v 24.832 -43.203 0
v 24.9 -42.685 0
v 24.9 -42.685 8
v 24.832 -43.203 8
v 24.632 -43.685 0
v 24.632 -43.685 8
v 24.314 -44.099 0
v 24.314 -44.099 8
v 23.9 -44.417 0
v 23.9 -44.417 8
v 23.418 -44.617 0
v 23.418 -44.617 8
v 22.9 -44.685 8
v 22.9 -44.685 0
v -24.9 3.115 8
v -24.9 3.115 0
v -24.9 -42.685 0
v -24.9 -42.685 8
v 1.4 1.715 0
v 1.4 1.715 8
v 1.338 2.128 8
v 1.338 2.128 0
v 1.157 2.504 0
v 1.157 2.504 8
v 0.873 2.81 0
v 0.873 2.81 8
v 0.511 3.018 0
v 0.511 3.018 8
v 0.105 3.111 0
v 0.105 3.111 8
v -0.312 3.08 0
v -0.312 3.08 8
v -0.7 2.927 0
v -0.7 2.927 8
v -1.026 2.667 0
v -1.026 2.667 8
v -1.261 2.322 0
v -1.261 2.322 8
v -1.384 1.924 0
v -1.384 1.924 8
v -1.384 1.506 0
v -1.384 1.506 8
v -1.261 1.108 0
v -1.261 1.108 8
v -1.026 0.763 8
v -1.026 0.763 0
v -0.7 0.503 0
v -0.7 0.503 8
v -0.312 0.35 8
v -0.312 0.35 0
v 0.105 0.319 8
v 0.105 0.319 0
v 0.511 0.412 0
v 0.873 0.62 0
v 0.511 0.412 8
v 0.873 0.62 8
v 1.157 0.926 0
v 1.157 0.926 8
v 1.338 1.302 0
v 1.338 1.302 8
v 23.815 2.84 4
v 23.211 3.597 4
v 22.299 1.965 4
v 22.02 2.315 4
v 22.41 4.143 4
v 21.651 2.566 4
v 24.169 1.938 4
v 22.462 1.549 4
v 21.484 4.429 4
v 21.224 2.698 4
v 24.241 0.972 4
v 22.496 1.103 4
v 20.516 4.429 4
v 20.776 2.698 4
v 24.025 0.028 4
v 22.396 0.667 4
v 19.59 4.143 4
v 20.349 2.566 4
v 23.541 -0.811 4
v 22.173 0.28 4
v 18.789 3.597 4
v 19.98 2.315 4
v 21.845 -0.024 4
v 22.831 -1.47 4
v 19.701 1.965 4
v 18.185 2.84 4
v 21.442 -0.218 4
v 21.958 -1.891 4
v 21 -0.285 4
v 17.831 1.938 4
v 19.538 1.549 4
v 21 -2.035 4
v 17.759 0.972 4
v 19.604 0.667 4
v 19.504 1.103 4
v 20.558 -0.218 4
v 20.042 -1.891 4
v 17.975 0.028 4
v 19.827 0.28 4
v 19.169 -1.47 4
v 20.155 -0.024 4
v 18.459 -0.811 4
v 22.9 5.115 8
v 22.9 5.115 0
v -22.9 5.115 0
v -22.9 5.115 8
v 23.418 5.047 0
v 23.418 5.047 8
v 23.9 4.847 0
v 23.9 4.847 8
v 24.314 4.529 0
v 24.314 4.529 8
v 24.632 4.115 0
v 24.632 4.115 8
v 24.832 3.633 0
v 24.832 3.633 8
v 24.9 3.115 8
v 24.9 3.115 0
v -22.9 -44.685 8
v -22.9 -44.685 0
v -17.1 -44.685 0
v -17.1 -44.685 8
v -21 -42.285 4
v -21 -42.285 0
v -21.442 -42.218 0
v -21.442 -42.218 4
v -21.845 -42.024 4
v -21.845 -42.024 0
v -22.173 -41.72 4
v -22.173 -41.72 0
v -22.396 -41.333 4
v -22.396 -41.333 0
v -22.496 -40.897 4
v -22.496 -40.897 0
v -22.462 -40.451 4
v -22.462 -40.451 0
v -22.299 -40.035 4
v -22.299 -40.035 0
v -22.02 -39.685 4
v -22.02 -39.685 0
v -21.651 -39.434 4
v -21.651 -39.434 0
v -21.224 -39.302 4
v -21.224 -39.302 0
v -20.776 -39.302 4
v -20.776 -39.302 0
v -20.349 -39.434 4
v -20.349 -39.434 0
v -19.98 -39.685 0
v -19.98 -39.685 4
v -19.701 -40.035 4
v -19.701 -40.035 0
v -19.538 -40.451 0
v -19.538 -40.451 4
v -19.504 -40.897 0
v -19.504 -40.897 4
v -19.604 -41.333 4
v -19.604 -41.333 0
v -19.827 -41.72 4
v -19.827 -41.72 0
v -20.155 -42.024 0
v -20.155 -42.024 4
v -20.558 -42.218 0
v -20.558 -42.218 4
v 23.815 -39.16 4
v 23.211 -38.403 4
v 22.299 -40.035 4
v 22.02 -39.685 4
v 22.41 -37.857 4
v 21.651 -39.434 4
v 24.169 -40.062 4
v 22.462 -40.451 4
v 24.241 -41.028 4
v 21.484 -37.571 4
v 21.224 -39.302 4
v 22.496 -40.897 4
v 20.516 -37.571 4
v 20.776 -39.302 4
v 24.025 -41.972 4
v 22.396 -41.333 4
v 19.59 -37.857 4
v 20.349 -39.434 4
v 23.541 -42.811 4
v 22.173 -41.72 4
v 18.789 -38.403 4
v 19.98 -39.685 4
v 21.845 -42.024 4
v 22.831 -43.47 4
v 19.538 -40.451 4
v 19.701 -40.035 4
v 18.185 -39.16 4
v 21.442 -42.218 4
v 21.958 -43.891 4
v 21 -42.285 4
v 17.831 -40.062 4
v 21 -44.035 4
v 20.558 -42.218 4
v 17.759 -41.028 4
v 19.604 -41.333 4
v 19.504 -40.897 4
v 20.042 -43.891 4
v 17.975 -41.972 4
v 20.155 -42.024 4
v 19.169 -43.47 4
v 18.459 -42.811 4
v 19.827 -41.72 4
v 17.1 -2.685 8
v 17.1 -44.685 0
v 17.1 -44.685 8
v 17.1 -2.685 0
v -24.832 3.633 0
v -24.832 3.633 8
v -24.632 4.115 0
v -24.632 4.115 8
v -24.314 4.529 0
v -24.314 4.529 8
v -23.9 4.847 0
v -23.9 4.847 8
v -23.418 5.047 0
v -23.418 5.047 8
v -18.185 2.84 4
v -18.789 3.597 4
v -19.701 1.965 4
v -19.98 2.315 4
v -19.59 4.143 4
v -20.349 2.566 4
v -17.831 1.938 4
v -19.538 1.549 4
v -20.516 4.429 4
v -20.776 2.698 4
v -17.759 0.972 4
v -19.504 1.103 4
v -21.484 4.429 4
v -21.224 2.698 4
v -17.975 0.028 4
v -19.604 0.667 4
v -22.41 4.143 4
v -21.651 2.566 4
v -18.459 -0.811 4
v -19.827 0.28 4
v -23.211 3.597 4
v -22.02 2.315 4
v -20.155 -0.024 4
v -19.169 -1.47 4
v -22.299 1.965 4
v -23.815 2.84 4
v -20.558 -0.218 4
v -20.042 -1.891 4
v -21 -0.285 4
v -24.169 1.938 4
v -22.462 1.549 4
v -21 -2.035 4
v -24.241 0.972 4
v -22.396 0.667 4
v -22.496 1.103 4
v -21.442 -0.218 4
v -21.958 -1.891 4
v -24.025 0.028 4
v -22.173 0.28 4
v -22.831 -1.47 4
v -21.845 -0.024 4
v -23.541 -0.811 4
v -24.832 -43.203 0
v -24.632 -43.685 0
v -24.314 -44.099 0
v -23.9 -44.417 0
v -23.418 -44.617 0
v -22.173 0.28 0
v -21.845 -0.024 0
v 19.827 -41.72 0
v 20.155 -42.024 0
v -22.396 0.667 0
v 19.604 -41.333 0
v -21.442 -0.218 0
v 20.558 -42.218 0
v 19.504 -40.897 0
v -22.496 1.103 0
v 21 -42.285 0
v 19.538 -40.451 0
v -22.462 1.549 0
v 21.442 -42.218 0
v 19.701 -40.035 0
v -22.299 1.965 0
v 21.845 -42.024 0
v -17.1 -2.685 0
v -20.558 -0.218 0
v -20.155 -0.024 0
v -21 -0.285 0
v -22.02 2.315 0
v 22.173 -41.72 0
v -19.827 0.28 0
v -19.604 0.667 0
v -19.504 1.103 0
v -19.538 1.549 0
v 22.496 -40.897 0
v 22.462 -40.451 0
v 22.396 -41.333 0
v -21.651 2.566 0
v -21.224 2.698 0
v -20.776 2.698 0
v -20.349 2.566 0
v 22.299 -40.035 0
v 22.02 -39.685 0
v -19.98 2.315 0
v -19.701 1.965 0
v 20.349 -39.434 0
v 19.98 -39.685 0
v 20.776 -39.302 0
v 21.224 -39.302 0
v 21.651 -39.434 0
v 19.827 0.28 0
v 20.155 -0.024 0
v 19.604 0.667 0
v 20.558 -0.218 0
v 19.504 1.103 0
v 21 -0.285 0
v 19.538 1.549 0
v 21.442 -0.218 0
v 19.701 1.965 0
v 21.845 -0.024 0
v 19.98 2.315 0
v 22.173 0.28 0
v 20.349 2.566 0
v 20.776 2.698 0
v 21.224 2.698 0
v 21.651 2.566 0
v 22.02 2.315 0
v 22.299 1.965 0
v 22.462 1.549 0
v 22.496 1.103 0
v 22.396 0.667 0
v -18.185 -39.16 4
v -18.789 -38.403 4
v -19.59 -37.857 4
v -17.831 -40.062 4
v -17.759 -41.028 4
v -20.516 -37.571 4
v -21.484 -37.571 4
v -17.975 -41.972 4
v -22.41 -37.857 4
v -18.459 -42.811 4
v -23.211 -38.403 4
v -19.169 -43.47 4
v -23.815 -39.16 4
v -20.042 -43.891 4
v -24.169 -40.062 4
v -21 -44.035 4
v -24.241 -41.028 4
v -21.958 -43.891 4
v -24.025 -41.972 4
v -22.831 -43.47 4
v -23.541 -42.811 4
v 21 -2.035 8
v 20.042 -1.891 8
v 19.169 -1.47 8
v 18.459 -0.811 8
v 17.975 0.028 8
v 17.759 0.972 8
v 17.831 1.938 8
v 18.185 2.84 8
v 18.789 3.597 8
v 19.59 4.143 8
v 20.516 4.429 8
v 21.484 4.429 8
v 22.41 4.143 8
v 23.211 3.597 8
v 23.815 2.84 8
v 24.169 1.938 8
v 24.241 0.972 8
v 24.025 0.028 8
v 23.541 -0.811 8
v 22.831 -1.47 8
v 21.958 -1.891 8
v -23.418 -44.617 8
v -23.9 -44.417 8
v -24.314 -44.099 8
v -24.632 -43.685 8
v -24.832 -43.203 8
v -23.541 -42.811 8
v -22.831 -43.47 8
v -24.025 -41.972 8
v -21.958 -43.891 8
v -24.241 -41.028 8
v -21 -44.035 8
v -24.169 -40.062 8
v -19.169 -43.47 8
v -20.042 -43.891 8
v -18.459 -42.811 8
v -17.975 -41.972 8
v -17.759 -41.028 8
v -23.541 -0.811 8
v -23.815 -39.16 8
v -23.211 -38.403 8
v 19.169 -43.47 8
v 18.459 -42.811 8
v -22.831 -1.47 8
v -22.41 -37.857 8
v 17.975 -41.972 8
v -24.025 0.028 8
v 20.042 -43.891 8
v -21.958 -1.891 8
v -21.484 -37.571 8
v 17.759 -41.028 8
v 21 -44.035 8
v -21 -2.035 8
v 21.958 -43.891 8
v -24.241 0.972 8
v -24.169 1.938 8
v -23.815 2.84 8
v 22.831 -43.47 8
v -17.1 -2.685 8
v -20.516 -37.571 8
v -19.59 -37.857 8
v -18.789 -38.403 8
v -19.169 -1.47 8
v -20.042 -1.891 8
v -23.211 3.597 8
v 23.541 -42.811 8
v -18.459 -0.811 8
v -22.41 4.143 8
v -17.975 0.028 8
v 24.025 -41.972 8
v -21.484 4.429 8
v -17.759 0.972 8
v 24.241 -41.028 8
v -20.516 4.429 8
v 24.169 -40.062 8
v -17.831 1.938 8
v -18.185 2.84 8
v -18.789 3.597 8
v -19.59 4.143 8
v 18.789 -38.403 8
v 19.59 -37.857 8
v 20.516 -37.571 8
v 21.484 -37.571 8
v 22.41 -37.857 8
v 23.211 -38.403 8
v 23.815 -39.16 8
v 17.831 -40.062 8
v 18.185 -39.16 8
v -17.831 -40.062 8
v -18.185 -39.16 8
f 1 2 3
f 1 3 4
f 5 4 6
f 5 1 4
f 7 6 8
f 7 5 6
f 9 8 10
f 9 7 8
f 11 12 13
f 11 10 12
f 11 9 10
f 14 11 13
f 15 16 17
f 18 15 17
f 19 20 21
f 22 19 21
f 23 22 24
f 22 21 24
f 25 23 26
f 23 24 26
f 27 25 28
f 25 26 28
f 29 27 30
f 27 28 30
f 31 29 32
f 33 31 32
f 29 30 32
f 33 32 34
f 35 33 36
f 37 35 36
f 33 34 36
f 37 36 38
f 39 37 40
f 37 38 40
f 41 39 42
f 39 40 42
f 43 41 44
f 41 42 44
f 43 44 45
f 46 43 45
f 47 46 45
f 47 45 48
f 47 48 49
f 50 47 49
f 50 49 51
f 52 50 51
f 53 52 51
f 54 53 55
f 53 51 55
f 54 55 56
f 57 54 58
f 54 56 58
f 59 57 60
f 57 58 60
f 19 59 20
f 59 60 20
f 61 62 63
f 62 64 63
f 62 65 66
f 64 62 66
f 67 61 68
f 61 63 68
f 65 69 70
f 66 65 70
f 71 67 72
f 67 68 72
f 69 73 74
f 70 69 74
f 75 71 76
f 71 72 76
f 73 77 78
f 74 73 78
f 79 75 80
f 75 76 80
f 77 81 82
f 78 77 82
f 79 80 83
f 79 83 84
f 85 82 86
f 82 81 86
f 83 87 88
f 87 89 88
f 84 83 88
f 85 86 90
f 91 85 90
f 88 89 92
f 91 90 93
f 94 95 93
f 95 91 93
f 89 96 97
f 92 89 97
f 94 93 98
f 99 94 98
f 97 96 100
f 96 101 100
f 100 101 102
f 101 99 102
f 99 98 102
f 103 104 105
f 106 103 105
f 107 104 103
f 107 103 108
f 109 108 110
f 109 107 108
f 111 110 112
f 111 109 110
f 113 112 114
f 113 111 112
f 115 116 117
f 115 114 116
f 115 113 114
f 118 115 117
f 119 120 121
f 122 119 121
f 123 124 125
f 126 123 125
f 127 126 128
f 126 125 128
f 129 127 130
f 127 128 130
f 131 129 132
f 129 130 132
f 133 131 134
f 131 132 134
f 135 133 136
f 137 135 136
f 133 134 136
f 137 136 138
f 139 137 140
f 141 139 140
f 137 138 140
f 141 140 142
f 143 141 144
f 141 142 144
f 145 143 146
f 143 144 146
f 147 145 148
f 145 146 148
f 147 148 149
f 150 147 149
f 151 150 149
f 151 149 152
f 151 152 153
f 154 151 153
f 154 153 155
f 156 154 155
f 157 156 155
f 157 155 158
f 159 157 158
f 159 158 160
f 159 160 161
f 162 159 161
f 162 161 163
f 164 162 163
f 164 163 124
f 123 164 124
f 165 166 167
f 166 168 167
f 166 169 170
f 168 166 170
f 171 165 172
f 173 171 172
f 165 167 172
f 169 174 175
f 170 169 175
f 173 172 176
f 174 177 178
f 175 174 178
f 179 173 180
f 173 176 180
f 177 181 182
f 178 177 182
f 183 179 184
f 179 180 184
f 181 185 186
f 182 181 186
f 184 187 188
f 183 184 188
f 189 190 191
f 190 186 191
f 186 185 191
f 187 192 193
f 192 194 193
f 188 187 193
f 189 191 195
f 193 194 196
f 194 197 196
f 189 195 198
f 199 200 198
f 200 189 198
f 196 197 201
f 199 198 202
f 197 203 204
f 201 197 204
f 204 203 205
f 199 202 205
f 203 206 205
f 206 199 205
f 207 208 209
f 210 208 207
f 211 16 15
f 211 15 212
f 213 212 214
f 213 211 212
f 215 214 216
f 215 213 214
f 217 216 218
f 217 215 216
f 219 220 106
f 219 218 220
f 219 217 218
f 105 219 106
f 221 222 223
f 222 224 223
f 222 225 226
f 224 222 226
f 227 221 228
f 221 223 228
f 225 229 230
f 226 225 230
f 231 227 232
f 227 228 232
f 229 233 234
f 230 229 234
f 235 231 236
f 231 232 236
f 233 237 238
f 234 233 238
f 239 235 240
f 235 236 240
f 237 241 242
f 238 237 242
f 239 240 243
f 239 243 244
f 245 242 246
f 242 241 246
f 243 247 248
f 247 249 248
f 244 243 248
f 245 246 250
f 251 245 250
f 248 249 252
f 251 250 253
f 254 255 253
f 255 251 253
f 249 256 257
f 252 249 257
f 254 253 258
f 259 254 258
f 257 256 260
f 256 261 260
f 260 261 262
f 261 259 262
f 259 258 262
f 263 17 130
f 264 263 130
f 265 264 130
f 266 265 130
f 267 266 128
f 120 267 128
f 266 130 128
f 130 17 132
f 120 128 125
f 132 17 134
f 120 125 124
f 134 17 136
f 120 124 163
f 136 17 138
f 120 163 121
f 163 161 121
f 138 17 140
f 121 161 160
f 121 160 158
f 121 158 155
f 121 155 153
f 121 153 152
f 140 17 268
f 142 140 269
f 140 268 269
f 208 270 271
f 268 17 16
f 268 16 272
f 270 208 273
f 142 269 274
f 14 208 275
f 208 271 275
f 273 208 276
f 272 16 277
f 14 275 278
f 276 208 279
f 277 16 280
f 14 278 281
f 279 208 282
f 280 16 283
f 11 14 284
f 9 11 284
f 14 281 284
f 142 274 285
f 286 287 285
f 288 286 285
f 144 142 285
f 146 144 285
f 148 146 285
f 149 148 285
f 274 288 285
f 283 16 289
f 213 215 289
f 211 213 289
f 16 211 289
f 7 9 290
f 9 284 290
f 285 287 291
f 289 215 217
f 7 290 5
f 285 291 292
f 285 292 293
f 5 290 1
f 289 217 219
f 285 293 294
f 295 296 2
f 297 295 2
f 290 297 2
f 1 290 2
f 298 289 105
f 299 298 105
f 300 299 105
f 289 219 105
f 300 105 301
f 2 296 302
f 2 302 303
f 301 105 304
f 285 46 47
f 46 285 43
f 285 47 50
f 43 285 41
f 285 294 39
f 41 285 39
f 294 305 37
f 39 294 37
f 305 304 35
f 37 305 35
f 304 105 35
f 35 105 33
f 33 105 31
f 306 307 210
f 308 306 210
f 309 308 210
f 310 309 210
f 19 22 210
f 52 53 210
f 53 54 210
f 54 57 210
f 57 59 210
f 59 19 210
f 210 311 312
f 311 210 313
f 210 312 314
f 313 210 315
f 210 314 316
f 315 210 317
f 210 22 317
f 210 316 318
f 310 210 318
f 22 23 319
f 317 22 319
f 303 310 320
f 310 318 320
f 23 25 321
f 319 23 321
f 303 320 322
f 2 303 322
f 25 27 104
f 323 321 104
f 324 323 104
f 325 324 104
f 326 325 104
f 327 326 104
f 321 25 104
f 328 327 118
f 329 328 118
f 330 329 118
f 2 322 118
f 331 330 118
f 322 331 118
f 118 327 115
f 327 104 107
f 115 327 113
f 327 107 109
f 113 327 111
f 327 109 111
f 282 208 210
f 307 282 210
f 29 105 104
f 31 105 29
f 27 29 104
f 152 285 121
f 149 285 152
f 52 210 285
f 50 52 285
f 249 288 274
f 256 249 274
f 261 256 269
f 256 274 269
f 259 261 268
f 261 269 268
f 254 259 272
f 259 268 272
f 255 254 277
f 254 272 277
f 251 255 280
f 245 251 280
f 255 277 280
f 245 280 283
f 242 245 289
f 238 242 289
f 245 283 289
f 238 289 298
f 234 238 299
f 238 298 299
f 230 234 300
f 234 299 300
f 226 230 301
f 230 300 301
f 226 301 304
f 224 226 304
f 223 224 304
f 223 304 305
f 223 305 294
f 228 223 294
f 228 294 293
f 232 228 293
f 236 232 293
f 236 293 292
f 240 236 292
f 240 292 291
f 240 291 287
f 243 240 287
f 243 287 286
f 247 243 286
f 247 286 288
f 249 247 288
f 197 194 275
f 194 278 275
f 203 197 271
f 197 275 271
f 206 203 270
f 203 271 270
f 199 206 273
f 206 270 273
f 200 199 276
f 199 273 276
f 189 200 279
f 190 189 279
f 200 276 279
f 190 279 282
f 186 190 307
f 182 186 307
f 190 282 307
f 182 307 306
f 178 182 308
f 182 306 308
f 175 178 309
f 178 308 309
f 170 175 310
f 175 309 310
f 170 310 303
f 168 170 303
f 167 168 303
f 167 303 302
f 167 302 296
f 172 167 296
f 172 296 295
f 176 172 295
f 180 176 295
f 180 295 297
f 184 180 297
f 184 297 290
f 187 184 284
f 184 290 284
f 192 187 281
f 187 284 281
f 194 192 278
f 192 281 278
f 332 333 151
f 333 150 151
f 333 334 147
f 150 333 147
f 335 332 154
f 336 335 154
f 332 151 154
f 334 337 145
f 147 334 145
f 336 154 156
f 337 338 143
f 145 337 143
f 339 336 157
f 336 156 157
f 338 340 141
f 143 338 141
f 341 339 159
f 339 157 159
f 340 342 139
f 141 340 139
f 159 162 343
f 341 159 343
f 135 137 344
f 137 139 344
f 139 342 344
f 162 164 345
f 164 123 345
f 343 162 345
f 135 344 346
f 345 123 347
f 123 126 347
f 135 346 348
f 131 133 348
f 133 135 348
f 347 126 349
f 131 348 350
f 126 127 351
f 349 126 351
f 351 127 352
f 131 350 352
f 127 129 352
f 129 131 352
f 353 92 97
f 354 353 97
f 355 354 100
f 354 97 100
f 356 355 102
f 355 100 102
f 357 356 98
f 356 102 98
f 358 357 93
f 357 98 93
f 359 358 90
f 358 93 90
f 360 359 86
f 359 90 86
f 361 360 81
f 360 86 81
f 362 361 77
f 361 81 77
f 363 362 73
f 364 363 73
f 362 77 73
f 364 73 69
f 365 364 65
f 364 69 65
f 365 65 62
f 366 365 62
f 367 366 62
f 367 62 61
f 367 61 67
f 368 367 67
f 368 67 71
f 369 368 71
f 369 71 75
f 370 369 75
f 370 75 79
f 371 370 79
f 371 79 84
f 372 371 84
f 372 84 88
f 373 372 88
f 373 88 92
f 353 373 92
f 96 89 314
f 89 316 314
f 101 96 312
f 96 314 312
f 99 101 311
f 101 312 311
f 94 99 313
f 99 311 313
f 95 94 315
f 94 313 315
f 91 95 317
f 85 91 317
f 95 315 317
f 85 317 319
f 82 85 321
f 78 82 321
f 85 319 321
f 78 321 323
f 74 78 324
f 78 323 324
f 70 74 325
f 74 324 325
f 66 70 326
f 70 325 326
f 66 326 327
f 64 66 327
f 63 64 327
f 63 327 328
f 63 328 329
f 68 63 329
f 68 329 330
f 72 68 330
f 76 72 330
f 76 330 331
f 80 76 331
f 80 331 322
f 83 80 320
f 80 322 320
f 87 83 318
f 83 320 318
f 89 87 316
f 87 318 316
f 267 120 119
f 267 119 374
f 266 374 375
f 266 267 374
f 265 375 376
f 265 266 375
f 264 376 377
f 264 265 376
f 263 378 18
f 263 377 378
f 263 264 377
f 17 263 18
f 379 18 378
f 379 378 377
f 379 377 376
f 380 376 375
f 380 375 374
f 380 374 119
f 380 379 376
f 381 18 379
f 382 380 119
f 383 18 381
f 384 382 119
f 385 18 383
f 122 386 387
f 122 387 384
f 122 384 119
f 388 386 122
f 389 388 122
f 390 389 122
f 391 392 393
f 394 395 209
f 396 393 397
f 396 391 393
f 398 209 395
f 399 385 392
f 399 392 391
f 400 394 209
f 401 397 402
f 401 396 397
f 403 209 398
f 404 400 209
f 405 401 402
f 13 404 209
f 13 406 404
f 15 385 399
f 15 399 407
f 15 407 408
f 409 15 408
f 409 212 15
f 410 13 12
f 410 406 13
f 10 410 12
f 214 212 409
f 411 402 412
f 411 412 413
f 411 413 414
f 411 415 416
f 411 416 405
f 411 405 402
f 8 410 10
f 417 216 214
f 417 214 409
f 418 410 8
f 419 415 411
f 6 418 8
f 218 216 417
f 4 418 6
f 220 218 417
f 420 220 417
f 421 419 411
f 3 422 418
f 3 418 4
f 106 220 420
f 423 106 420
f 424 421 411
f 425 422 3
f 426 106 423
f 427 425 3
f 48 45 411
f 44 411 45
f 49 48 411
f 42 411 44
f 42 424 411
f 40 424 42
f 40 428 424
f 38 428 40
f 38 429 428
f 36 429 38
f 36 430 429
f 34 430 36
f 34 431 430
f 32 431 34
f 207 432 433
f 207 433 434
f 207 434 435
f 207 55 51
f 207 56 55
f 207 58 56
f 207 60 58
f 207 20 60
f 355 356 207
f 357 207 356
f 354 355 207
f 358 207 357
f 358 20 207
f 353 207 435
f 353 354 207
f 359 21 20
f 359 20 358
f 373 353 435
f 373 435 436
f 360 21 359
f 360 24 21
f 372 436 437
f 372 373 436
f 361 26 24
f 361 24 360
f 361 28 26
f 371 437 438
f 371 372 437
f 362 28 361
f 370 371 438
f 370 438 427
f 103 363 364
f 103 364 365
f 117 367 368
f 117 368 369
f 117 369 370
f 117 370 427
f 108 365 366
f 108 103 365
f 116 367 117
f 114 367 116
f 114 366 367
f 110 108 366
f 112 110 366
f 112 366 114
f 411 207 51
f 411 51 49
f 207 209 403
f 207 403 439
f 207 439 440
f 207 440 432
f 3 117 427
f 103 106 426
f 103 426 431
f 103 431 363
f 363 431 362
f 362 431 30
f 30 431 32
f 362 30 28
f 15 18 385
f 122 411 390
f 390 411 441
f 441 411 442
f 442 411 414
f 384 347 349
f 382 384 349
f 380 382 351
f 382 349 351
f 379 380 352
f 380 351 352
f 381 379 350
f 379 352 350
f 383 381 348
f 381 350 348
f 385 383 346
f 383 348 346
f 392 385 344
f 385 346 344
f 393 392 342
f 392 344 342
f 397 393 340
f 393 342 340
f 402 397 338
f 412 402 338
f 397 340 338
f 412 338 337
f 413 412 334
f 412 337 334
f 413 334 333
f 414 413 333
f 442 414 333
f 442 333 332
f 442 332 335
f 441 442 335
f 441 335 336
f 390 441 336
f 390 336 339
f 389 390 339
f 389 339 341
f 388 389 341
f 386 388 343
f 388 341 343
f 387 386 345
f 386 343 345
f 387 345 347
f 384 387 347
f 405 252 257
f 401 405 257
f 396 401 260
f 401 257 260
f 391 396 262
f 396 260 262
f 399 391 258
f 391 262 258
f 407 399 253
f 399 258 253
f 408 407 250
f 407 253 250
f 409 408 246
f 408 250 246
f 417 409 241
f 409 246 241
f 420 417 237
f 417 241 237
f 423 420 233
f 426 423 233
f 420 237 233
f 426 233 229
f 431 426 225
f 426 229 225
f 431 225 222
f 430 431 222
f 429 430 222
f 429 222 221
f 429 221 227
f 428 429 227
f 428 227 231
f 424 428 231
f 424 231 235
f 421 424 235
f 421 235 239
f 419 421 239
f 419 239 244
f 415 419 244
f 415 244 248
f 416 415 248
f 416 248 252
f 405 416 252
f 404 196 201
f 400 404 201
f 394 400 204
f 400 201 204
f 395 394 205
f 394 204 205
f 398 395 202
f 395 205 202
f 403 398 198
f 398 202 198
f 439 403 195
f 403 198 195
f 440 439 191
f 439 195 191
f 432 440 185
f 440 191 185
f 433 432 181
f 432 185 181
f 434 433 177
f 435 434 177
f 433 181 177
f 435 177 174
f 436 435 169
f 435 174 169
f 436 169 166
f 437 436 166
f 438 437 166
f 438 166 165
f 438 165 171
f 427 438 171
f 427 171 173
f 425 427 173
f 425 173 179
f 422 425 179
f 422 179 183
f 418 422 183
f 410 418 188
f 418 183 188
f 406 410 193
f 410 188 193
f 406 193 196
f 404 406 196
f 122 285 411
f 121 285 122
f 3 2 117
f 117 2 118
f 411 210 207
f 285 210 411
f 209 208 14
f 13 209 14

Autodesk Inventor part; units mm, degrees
ref_plane "YZ Plane" through (0, 0, 0) normal (1, 0, 0) x (0, 1, 0)
ref_plane "XZ Plane" through (0, 0, 0) normal (0, 1, 0) x (-1, 0, 0)
ref_plane "XY Plane" through (0, 0, 0) normal (0, 0, 1) x (1, 0, 0)
sketch "Sketch1" plane through (0, 0, 0) normal (0, 0, 1) x (1, 0, 0)
  circle A0 centre (-21, 1.215) radius 1.4 projected
  circle A1 centre (21, 1.215) radius 1.4 projected
  arc A2 (24.9, 3.115) -> (22.9, 5.115) centre (22.9, 3.115) ccw projected
  line L0 (22.9, 5.115) -> (-22.9, 5.115) projected
  arc A3 (-22.9, 5.115) -> (-24.9, 3.115) centre (-22.9, 3.115) ccw projected
  line L1 (-24.9, 3.115) -> (-24.9, -5.115) projected
  line L2 (-24.9, -5.115) -> (-22.8395, -5.115) projected
  line L3 (24.9, -5.115) -> (24.9, 3.115) projected
  arc A4 (22.9, -44.685) -> (24.9, -42.685) centre (22.9, -42.685) ccw projected
  line L4 (24.9, -42.685) -> (24.9, -36.885) projected
  line L5 (24.9, -36.885) -> (17.1, -36.885) projected
  line L6 (17.1, -36.885) -> (17.1, -44.685) projected
  line L7 (17.1, -44.685) -> (22.9, -44.685) projected
  circle A5 centre (21, -40.785) radius 1.4 projected
  arc A6 (-24.9, -42.685) -> (-22.9, -44.685) centre (-22.9, -42.685) ccw projected
  line L8 (-22.9, -44.685) -> (-17.1, -44.685) projected
  line L9 (-17.1, -44.685) -> (-17.1, -36.885) projected
  line L10 (-17.1, -36.885) -> (-24.9, -36.885) projected
  line L11 (-24.9, -36.885) -> (-24.9, -42.685) projected
  circle A7 centre (-21, -40.785) radius 1.4 projected
  line L12 (24.9, 5.115) -> (-24.9, 5.115)
  line L13 (-24.9, 5.115) -> (-24.9, -44.685)
  line L14 (-24.9, -44.685) -> (24.9, -44.685)
  line L15 (24.9, -44.685) -> (24.9, 5.115)
  line L16 (17.1, -2.685) -> (-17.1, -2.685)
  line L17 (-17.1, -2.685) -> (-17.1, -36.885)
  line L18 (-17.1, -36.885) -> (17.1, -36.885)
  line L19 (17.1, -36.885) -> (17.1, -2.685)
  line L20 (17.1, -36.885) -> (17.1, -44.685)
  line L21 (-17.1, -36.885) -> (-17.1, -44.685)
  circle A8 centre (0, 1.415) radius 1.4 projected
  arc A9 (-18.2605, -5.115) -> (-22.8395, -5.115) centre (-20.55, -5.335) ccw projected
  arc A10 (22.8395, -5.115) -> (18.2605, -5.115) centre (20.55, -5.335) ccw projected
  circle A11 centre (14.45, 0.765) radius 2.3 projected
  circle A12 centre (-14.45, 0.765) radius 2.3 projected
  line L22 (-18.2605, -5.115) -> (18.2605, -5.115) projected
  line L23 (22.8395, -5.115) -> (24.9, -5.115) projected
  point P0 (0, 0)
  point P1 (-20.55, -5.335)
  point P2 (20.55, -5.335)
  point P3 (-20.55, -5.335)
  point P4 (20.55, -5.335)
  point P5 (-20.55, -5.335)
  point P6 (20.55, -5.335)
  dimension "d0" = 7.8
extrude "Extrusion1" add sketch "Sketch1" along normal blind 8 contours L3 L23 A10 L22 L19 L16 L17 A9 L2 L1 A3 L0 A2 | L15 L5 L19 L22 A10 L23 | L4 A4 L7 L6 L5 | L2 A9 L22 L17 L10 L13 | L9 L8 A6 L11 L10 | A8 | A11 | A12
sketch "Sketch2" plane through (0, 0, 8) normal (0, 0, 1) x (1, 0, 0)
  circle A0 centre (0, 1.715) radius 1.4
  line L0 (22.9, 5.115) -> (-22.9, 5.115) projected
  point P0 (0, 0)
  dimension "d3" = 2.8
  dimension "d4" = 3.4
extrude "Extrusion2" cut sketch "Sketch2" against normal blind 8
ref_plane "Arbeitsebene1" through (15.3065, -4.4785, 13.1) normal (0, 0, 1) x (0, 1, 0)
sketch "Skizze3" plane through (15.3065, -4.4785, 13.1) normal (0, 0, 1) x (0, 1, 0)
  line L0 (-0.7065, 32.7565) -> (-31.2065, 32.7565) projected
  arc A0 (1.2935, 30.7565) -> (-0.7065, 32.7565) centre (-0.7065, 30.7565) ccw projected
  line L1 (1.2935, 30.7565) -> (1.2935, 0.2565) projected
  arc A1 (-0.7065, -1.7435) -> (1.2935, 0.2565) centre (-0.7065, 0.2565) ccw projected
  line L2 (-0.7065, -1.7435) -> (-31.2065, -1.7435) projected
  arc A2 (-33.2065, 0.2565) -> (-31.2065, -1.7435) centre (-31.2065, 0.2565) ccw projected
  line L3 (-33.2065, 0.2565) -> (-33.2065, 30.7565) projected
  arc A3 (-31.2065, 32.7565) -> (-33.2065, 30.7565) centre (-31.2065, 30.7565) ccw projected
  line L4 (-38.9565, -9.4935) -> (-20.9565, -9.4935) projected
  arc A4 (7.0435, -9.4935) -> (9.0435, -7.4935) centre (7.0435, -7.4935) ccw projected
  line L5 (9.0435, 10.5065) -> (9.0435, -7.4935) projected
  line L6 (9.0435, 10.5065) -> (10.195, 10.5065) projected
  arc A5 (10.6845, 10.1086) -> (10.195, 10.5065) centre (10.195, 10.0065) ccw projected
  arc A6 (10.6845, 10.1086) -> (14.5435, 10.5065) centre (12.5935, 10.5065) ccw projected
  line L7 (14.5435, 10.5065) -> (14.5435, 20.6065) projected
  line L8 (9.0435, 38.5065) -> (9.0435, 20.5065) projected
  arc A7 (9.0435, 38.5065) -> (7.0435, 40.5065) centre (7.0435, 38.5065) ccw projected
  line L9 (-21.0689, 40.5065) -> (-38.9565, 40.5065) projected
  line L10 (7.0435, 40.5065) -> (-10.8565, 40.5065) projected
  arc A8 (-38.9565, 40.5065) -> (-40.9565, 38.5065) centre (-38.9565, 38.5065) ccw projected
  line L11 (-40.9565, 20.6065) -> (-40.9565, 38.5065) projected
  line L12 (-40.9565, -7.4935) -> (-40.9565, 10.3942) projected
  arc A9 (-40.9565, -7.4935) -> (-38.9565, -9.4935) centre (-38.9565, -7.4935) ccw projected
  line L13 (-20.9565, -9.4935) -> (-20.9565, -10.645) projected
  arc A10 (-21.3545, -11.1345) -> (-20.9565, -10.645) centre (-21.4565, -10.645) ccw projected
  arc A11 (-21.3545, -11.1345) -> (-20.9565, -14.9935) centre (-20.9565, -13.0435) ccw projected
  line L14 (-20.9565, -14.9935) -> (-10.8565, -14.9935) projected
  circle A12 centre (-15.9565, -5.8535) radius 1.6 projected
  circle A13 centre (5.4035, 15.5065) radius 1.6 projected
  line L15 (-21.0689, 39.3752) -> (-21.0689, 40.5065) projected
  line L16 (-40.9565, 20.6065) -> (-39.8237, 20.6065) projected
  arc A14 (-39.8237, 20.6065) -> (-39.429, 20.9412) centre (-39.8237, 21.0065) ccw projected
  arc A15 (-35.3565, 20.6065) -> (-39.429, 20.9412) centre (-37.4065, 20.6065) ccw projected
  line L17 (-35.3565, 20.6065) -> (-35.3565, 10.5065) projected
  arc A16 (-39.4194, 10.1183) -> (-35.3565, 10.5065) centre (-37.4065, 10.5065) ccw projected
  arc A17 (-39.4194, 10.1183) -> (-39.8252, 10.3942) centre (-39.7609, 10.0524) ccw projected
  line L18 (-39.8252, 10.3942) -> (-40.9565, 10.3942) projected
  arc A18 (-10.8565, -14.9935) -> (-10.5382, -11.1196) centre (-10.8565, -13.0435) ccw projected
  arc A19 (-10.9565, -10.6263) -> (-10.5382, -11.1196) centre (-10.4565, -10.6263) ccw projected
  line L19 (-10.9565, -10.6263) -> (-10.9565, -9.4935) projected
  line L20 (-10.9565, -9.4935) -> (7.0435, -9.4935) projected
  arc A20 (14.5435, 20.6065) -> (10.6696, 20.9249) centre (12.5935, 20.6065) ccw projected
  arc A21 (10.1763, 20.5065) -> (10.6696, 20.9249) centre (10.1763, 21.0065) ccw projected
  line L21 (10.1763, 20.5065) -> (9.0435, 20.5065) projected
  line L22 (-10.8565, 40.5065) -> (-10.8565, 39.3737) projected
  arc A22 (-10.8565, 39.3737) -> (-10.5218, 38.979) centre (-10.4565, 39.3737) ccw projected
  arc A23 (-10.8565, 34.9065) -> (-10.5218, 38.979) centre (-10.8565, 36.9565) ccw projected
  line L23 (-10.8565, 34.9065) -> (-20.9565, 34.9065) projected
  arc A24 (-21.3448, 38.9694) -> (-20.9565, 34.9065) centre (-20.9565, 36.9565) ccw projected
  arc A25 (-21.3448, 38.9694) -> (-21.0689, 39.3752) centre (-21.4107, 39.3109) ccw projected
  circle A26 centre (4.0435, -4.4935) radius 2.45 projected
  circle A27 centre (-1.4565, -5.2935) radius 2.3 projected
  circle A28 centre (4.8435, 1.0065) radius 2.3 projected
  circle A29 centre (4.8435, 30.0065) radius 2.3 projected
  circle A30 centre (-1.4565, 36.3065) radius 2.3 projected
  circle A31 centre (4.0435, 35.5065) radius 2.45 projected
  circle A32 centre (-36.7565, 1.0065) radius 2.3 projected
  circle A33 centre (-30.4565, -5.2935) radius 2.3 projected
  circle A34 centre (-35.9565, -4.4935) radius 2.45 projected
  circle A35 centre (-36.7565, 30.0065) radius 2.3 projected
  circle A36 centre (-30.4565, 36.3065) radius 2.3 projected
  circle A37 centre (-35.9565, 35.5065) radius 2.45 projected
  point P0 (4.4785, 15.3065)
hole "Bohrung1" [suppressed]
sketch "Skizze4" plane through (0, 0, 8) normal (0, 0, 1) x (1, 0, 0)
  circle A0 centre (0, 1.715) radius 1.4 projected
  line L0 (17.1, -2.685) -> (17.1, -44.685) projected
  line L1 (17.1, -44.685) -> (22.9, -44.685) projected
  arc A1 (22.9, -44.685) -> (24.9, -42.685) centre (22.9, -42.685) ccw projected
  line L2 (24.9, -42.685) -> (24.9, 3.115) projected
  arc A2 (24.9, 3.115) -> (22.9, 5.115) centre (22.9, 3.115) ccw projected
  line L3 (22.9, 5.115) -> (-22.9, 5.115) projected
  arc A3 (-22.9, 5.115) -> (-24.9, 3.115) centre (-22.9, 3.115) ccw projected
  line L4 (-24.9, 3.115) -> (-24.9, -42.685) projected
  arc A4 (-24.9, -42.685) -> (-22.9, -44.685) centre (-22.9, -42.685) ccw projected
  line L5 (-22.9, -44.685) -> (-17.1, -44.685) projected
  line L6 (-17.1, -44.685) -> (-17.1, -2.685) projected
  line L7 (-17.1, -2.685) -> (17.1, -2.685) projected
  circle A5 centre (-21, -40.785) radius 1.4 projected
  circle A6 centre (21, -40.785) radius 1.4 projected
  circle A7 centre (-21, 1.215) radius 1.4 projected
  circle A8 centre (21, 1.215) radius 1.4 projected
  point P0 (0, 0)
hole "Bohrung2" at (-21, 1.215, 8) at (21, 1.215, 8) at (21, -40.785, 8) at (-21, -40.785, 8) direction (0, 0, -1) diameter 3 end through all counterbore diameter 6.5 counterbore depth 4
properties part number "00_Linear_Stage_NEMA11_Mount_Lid"
